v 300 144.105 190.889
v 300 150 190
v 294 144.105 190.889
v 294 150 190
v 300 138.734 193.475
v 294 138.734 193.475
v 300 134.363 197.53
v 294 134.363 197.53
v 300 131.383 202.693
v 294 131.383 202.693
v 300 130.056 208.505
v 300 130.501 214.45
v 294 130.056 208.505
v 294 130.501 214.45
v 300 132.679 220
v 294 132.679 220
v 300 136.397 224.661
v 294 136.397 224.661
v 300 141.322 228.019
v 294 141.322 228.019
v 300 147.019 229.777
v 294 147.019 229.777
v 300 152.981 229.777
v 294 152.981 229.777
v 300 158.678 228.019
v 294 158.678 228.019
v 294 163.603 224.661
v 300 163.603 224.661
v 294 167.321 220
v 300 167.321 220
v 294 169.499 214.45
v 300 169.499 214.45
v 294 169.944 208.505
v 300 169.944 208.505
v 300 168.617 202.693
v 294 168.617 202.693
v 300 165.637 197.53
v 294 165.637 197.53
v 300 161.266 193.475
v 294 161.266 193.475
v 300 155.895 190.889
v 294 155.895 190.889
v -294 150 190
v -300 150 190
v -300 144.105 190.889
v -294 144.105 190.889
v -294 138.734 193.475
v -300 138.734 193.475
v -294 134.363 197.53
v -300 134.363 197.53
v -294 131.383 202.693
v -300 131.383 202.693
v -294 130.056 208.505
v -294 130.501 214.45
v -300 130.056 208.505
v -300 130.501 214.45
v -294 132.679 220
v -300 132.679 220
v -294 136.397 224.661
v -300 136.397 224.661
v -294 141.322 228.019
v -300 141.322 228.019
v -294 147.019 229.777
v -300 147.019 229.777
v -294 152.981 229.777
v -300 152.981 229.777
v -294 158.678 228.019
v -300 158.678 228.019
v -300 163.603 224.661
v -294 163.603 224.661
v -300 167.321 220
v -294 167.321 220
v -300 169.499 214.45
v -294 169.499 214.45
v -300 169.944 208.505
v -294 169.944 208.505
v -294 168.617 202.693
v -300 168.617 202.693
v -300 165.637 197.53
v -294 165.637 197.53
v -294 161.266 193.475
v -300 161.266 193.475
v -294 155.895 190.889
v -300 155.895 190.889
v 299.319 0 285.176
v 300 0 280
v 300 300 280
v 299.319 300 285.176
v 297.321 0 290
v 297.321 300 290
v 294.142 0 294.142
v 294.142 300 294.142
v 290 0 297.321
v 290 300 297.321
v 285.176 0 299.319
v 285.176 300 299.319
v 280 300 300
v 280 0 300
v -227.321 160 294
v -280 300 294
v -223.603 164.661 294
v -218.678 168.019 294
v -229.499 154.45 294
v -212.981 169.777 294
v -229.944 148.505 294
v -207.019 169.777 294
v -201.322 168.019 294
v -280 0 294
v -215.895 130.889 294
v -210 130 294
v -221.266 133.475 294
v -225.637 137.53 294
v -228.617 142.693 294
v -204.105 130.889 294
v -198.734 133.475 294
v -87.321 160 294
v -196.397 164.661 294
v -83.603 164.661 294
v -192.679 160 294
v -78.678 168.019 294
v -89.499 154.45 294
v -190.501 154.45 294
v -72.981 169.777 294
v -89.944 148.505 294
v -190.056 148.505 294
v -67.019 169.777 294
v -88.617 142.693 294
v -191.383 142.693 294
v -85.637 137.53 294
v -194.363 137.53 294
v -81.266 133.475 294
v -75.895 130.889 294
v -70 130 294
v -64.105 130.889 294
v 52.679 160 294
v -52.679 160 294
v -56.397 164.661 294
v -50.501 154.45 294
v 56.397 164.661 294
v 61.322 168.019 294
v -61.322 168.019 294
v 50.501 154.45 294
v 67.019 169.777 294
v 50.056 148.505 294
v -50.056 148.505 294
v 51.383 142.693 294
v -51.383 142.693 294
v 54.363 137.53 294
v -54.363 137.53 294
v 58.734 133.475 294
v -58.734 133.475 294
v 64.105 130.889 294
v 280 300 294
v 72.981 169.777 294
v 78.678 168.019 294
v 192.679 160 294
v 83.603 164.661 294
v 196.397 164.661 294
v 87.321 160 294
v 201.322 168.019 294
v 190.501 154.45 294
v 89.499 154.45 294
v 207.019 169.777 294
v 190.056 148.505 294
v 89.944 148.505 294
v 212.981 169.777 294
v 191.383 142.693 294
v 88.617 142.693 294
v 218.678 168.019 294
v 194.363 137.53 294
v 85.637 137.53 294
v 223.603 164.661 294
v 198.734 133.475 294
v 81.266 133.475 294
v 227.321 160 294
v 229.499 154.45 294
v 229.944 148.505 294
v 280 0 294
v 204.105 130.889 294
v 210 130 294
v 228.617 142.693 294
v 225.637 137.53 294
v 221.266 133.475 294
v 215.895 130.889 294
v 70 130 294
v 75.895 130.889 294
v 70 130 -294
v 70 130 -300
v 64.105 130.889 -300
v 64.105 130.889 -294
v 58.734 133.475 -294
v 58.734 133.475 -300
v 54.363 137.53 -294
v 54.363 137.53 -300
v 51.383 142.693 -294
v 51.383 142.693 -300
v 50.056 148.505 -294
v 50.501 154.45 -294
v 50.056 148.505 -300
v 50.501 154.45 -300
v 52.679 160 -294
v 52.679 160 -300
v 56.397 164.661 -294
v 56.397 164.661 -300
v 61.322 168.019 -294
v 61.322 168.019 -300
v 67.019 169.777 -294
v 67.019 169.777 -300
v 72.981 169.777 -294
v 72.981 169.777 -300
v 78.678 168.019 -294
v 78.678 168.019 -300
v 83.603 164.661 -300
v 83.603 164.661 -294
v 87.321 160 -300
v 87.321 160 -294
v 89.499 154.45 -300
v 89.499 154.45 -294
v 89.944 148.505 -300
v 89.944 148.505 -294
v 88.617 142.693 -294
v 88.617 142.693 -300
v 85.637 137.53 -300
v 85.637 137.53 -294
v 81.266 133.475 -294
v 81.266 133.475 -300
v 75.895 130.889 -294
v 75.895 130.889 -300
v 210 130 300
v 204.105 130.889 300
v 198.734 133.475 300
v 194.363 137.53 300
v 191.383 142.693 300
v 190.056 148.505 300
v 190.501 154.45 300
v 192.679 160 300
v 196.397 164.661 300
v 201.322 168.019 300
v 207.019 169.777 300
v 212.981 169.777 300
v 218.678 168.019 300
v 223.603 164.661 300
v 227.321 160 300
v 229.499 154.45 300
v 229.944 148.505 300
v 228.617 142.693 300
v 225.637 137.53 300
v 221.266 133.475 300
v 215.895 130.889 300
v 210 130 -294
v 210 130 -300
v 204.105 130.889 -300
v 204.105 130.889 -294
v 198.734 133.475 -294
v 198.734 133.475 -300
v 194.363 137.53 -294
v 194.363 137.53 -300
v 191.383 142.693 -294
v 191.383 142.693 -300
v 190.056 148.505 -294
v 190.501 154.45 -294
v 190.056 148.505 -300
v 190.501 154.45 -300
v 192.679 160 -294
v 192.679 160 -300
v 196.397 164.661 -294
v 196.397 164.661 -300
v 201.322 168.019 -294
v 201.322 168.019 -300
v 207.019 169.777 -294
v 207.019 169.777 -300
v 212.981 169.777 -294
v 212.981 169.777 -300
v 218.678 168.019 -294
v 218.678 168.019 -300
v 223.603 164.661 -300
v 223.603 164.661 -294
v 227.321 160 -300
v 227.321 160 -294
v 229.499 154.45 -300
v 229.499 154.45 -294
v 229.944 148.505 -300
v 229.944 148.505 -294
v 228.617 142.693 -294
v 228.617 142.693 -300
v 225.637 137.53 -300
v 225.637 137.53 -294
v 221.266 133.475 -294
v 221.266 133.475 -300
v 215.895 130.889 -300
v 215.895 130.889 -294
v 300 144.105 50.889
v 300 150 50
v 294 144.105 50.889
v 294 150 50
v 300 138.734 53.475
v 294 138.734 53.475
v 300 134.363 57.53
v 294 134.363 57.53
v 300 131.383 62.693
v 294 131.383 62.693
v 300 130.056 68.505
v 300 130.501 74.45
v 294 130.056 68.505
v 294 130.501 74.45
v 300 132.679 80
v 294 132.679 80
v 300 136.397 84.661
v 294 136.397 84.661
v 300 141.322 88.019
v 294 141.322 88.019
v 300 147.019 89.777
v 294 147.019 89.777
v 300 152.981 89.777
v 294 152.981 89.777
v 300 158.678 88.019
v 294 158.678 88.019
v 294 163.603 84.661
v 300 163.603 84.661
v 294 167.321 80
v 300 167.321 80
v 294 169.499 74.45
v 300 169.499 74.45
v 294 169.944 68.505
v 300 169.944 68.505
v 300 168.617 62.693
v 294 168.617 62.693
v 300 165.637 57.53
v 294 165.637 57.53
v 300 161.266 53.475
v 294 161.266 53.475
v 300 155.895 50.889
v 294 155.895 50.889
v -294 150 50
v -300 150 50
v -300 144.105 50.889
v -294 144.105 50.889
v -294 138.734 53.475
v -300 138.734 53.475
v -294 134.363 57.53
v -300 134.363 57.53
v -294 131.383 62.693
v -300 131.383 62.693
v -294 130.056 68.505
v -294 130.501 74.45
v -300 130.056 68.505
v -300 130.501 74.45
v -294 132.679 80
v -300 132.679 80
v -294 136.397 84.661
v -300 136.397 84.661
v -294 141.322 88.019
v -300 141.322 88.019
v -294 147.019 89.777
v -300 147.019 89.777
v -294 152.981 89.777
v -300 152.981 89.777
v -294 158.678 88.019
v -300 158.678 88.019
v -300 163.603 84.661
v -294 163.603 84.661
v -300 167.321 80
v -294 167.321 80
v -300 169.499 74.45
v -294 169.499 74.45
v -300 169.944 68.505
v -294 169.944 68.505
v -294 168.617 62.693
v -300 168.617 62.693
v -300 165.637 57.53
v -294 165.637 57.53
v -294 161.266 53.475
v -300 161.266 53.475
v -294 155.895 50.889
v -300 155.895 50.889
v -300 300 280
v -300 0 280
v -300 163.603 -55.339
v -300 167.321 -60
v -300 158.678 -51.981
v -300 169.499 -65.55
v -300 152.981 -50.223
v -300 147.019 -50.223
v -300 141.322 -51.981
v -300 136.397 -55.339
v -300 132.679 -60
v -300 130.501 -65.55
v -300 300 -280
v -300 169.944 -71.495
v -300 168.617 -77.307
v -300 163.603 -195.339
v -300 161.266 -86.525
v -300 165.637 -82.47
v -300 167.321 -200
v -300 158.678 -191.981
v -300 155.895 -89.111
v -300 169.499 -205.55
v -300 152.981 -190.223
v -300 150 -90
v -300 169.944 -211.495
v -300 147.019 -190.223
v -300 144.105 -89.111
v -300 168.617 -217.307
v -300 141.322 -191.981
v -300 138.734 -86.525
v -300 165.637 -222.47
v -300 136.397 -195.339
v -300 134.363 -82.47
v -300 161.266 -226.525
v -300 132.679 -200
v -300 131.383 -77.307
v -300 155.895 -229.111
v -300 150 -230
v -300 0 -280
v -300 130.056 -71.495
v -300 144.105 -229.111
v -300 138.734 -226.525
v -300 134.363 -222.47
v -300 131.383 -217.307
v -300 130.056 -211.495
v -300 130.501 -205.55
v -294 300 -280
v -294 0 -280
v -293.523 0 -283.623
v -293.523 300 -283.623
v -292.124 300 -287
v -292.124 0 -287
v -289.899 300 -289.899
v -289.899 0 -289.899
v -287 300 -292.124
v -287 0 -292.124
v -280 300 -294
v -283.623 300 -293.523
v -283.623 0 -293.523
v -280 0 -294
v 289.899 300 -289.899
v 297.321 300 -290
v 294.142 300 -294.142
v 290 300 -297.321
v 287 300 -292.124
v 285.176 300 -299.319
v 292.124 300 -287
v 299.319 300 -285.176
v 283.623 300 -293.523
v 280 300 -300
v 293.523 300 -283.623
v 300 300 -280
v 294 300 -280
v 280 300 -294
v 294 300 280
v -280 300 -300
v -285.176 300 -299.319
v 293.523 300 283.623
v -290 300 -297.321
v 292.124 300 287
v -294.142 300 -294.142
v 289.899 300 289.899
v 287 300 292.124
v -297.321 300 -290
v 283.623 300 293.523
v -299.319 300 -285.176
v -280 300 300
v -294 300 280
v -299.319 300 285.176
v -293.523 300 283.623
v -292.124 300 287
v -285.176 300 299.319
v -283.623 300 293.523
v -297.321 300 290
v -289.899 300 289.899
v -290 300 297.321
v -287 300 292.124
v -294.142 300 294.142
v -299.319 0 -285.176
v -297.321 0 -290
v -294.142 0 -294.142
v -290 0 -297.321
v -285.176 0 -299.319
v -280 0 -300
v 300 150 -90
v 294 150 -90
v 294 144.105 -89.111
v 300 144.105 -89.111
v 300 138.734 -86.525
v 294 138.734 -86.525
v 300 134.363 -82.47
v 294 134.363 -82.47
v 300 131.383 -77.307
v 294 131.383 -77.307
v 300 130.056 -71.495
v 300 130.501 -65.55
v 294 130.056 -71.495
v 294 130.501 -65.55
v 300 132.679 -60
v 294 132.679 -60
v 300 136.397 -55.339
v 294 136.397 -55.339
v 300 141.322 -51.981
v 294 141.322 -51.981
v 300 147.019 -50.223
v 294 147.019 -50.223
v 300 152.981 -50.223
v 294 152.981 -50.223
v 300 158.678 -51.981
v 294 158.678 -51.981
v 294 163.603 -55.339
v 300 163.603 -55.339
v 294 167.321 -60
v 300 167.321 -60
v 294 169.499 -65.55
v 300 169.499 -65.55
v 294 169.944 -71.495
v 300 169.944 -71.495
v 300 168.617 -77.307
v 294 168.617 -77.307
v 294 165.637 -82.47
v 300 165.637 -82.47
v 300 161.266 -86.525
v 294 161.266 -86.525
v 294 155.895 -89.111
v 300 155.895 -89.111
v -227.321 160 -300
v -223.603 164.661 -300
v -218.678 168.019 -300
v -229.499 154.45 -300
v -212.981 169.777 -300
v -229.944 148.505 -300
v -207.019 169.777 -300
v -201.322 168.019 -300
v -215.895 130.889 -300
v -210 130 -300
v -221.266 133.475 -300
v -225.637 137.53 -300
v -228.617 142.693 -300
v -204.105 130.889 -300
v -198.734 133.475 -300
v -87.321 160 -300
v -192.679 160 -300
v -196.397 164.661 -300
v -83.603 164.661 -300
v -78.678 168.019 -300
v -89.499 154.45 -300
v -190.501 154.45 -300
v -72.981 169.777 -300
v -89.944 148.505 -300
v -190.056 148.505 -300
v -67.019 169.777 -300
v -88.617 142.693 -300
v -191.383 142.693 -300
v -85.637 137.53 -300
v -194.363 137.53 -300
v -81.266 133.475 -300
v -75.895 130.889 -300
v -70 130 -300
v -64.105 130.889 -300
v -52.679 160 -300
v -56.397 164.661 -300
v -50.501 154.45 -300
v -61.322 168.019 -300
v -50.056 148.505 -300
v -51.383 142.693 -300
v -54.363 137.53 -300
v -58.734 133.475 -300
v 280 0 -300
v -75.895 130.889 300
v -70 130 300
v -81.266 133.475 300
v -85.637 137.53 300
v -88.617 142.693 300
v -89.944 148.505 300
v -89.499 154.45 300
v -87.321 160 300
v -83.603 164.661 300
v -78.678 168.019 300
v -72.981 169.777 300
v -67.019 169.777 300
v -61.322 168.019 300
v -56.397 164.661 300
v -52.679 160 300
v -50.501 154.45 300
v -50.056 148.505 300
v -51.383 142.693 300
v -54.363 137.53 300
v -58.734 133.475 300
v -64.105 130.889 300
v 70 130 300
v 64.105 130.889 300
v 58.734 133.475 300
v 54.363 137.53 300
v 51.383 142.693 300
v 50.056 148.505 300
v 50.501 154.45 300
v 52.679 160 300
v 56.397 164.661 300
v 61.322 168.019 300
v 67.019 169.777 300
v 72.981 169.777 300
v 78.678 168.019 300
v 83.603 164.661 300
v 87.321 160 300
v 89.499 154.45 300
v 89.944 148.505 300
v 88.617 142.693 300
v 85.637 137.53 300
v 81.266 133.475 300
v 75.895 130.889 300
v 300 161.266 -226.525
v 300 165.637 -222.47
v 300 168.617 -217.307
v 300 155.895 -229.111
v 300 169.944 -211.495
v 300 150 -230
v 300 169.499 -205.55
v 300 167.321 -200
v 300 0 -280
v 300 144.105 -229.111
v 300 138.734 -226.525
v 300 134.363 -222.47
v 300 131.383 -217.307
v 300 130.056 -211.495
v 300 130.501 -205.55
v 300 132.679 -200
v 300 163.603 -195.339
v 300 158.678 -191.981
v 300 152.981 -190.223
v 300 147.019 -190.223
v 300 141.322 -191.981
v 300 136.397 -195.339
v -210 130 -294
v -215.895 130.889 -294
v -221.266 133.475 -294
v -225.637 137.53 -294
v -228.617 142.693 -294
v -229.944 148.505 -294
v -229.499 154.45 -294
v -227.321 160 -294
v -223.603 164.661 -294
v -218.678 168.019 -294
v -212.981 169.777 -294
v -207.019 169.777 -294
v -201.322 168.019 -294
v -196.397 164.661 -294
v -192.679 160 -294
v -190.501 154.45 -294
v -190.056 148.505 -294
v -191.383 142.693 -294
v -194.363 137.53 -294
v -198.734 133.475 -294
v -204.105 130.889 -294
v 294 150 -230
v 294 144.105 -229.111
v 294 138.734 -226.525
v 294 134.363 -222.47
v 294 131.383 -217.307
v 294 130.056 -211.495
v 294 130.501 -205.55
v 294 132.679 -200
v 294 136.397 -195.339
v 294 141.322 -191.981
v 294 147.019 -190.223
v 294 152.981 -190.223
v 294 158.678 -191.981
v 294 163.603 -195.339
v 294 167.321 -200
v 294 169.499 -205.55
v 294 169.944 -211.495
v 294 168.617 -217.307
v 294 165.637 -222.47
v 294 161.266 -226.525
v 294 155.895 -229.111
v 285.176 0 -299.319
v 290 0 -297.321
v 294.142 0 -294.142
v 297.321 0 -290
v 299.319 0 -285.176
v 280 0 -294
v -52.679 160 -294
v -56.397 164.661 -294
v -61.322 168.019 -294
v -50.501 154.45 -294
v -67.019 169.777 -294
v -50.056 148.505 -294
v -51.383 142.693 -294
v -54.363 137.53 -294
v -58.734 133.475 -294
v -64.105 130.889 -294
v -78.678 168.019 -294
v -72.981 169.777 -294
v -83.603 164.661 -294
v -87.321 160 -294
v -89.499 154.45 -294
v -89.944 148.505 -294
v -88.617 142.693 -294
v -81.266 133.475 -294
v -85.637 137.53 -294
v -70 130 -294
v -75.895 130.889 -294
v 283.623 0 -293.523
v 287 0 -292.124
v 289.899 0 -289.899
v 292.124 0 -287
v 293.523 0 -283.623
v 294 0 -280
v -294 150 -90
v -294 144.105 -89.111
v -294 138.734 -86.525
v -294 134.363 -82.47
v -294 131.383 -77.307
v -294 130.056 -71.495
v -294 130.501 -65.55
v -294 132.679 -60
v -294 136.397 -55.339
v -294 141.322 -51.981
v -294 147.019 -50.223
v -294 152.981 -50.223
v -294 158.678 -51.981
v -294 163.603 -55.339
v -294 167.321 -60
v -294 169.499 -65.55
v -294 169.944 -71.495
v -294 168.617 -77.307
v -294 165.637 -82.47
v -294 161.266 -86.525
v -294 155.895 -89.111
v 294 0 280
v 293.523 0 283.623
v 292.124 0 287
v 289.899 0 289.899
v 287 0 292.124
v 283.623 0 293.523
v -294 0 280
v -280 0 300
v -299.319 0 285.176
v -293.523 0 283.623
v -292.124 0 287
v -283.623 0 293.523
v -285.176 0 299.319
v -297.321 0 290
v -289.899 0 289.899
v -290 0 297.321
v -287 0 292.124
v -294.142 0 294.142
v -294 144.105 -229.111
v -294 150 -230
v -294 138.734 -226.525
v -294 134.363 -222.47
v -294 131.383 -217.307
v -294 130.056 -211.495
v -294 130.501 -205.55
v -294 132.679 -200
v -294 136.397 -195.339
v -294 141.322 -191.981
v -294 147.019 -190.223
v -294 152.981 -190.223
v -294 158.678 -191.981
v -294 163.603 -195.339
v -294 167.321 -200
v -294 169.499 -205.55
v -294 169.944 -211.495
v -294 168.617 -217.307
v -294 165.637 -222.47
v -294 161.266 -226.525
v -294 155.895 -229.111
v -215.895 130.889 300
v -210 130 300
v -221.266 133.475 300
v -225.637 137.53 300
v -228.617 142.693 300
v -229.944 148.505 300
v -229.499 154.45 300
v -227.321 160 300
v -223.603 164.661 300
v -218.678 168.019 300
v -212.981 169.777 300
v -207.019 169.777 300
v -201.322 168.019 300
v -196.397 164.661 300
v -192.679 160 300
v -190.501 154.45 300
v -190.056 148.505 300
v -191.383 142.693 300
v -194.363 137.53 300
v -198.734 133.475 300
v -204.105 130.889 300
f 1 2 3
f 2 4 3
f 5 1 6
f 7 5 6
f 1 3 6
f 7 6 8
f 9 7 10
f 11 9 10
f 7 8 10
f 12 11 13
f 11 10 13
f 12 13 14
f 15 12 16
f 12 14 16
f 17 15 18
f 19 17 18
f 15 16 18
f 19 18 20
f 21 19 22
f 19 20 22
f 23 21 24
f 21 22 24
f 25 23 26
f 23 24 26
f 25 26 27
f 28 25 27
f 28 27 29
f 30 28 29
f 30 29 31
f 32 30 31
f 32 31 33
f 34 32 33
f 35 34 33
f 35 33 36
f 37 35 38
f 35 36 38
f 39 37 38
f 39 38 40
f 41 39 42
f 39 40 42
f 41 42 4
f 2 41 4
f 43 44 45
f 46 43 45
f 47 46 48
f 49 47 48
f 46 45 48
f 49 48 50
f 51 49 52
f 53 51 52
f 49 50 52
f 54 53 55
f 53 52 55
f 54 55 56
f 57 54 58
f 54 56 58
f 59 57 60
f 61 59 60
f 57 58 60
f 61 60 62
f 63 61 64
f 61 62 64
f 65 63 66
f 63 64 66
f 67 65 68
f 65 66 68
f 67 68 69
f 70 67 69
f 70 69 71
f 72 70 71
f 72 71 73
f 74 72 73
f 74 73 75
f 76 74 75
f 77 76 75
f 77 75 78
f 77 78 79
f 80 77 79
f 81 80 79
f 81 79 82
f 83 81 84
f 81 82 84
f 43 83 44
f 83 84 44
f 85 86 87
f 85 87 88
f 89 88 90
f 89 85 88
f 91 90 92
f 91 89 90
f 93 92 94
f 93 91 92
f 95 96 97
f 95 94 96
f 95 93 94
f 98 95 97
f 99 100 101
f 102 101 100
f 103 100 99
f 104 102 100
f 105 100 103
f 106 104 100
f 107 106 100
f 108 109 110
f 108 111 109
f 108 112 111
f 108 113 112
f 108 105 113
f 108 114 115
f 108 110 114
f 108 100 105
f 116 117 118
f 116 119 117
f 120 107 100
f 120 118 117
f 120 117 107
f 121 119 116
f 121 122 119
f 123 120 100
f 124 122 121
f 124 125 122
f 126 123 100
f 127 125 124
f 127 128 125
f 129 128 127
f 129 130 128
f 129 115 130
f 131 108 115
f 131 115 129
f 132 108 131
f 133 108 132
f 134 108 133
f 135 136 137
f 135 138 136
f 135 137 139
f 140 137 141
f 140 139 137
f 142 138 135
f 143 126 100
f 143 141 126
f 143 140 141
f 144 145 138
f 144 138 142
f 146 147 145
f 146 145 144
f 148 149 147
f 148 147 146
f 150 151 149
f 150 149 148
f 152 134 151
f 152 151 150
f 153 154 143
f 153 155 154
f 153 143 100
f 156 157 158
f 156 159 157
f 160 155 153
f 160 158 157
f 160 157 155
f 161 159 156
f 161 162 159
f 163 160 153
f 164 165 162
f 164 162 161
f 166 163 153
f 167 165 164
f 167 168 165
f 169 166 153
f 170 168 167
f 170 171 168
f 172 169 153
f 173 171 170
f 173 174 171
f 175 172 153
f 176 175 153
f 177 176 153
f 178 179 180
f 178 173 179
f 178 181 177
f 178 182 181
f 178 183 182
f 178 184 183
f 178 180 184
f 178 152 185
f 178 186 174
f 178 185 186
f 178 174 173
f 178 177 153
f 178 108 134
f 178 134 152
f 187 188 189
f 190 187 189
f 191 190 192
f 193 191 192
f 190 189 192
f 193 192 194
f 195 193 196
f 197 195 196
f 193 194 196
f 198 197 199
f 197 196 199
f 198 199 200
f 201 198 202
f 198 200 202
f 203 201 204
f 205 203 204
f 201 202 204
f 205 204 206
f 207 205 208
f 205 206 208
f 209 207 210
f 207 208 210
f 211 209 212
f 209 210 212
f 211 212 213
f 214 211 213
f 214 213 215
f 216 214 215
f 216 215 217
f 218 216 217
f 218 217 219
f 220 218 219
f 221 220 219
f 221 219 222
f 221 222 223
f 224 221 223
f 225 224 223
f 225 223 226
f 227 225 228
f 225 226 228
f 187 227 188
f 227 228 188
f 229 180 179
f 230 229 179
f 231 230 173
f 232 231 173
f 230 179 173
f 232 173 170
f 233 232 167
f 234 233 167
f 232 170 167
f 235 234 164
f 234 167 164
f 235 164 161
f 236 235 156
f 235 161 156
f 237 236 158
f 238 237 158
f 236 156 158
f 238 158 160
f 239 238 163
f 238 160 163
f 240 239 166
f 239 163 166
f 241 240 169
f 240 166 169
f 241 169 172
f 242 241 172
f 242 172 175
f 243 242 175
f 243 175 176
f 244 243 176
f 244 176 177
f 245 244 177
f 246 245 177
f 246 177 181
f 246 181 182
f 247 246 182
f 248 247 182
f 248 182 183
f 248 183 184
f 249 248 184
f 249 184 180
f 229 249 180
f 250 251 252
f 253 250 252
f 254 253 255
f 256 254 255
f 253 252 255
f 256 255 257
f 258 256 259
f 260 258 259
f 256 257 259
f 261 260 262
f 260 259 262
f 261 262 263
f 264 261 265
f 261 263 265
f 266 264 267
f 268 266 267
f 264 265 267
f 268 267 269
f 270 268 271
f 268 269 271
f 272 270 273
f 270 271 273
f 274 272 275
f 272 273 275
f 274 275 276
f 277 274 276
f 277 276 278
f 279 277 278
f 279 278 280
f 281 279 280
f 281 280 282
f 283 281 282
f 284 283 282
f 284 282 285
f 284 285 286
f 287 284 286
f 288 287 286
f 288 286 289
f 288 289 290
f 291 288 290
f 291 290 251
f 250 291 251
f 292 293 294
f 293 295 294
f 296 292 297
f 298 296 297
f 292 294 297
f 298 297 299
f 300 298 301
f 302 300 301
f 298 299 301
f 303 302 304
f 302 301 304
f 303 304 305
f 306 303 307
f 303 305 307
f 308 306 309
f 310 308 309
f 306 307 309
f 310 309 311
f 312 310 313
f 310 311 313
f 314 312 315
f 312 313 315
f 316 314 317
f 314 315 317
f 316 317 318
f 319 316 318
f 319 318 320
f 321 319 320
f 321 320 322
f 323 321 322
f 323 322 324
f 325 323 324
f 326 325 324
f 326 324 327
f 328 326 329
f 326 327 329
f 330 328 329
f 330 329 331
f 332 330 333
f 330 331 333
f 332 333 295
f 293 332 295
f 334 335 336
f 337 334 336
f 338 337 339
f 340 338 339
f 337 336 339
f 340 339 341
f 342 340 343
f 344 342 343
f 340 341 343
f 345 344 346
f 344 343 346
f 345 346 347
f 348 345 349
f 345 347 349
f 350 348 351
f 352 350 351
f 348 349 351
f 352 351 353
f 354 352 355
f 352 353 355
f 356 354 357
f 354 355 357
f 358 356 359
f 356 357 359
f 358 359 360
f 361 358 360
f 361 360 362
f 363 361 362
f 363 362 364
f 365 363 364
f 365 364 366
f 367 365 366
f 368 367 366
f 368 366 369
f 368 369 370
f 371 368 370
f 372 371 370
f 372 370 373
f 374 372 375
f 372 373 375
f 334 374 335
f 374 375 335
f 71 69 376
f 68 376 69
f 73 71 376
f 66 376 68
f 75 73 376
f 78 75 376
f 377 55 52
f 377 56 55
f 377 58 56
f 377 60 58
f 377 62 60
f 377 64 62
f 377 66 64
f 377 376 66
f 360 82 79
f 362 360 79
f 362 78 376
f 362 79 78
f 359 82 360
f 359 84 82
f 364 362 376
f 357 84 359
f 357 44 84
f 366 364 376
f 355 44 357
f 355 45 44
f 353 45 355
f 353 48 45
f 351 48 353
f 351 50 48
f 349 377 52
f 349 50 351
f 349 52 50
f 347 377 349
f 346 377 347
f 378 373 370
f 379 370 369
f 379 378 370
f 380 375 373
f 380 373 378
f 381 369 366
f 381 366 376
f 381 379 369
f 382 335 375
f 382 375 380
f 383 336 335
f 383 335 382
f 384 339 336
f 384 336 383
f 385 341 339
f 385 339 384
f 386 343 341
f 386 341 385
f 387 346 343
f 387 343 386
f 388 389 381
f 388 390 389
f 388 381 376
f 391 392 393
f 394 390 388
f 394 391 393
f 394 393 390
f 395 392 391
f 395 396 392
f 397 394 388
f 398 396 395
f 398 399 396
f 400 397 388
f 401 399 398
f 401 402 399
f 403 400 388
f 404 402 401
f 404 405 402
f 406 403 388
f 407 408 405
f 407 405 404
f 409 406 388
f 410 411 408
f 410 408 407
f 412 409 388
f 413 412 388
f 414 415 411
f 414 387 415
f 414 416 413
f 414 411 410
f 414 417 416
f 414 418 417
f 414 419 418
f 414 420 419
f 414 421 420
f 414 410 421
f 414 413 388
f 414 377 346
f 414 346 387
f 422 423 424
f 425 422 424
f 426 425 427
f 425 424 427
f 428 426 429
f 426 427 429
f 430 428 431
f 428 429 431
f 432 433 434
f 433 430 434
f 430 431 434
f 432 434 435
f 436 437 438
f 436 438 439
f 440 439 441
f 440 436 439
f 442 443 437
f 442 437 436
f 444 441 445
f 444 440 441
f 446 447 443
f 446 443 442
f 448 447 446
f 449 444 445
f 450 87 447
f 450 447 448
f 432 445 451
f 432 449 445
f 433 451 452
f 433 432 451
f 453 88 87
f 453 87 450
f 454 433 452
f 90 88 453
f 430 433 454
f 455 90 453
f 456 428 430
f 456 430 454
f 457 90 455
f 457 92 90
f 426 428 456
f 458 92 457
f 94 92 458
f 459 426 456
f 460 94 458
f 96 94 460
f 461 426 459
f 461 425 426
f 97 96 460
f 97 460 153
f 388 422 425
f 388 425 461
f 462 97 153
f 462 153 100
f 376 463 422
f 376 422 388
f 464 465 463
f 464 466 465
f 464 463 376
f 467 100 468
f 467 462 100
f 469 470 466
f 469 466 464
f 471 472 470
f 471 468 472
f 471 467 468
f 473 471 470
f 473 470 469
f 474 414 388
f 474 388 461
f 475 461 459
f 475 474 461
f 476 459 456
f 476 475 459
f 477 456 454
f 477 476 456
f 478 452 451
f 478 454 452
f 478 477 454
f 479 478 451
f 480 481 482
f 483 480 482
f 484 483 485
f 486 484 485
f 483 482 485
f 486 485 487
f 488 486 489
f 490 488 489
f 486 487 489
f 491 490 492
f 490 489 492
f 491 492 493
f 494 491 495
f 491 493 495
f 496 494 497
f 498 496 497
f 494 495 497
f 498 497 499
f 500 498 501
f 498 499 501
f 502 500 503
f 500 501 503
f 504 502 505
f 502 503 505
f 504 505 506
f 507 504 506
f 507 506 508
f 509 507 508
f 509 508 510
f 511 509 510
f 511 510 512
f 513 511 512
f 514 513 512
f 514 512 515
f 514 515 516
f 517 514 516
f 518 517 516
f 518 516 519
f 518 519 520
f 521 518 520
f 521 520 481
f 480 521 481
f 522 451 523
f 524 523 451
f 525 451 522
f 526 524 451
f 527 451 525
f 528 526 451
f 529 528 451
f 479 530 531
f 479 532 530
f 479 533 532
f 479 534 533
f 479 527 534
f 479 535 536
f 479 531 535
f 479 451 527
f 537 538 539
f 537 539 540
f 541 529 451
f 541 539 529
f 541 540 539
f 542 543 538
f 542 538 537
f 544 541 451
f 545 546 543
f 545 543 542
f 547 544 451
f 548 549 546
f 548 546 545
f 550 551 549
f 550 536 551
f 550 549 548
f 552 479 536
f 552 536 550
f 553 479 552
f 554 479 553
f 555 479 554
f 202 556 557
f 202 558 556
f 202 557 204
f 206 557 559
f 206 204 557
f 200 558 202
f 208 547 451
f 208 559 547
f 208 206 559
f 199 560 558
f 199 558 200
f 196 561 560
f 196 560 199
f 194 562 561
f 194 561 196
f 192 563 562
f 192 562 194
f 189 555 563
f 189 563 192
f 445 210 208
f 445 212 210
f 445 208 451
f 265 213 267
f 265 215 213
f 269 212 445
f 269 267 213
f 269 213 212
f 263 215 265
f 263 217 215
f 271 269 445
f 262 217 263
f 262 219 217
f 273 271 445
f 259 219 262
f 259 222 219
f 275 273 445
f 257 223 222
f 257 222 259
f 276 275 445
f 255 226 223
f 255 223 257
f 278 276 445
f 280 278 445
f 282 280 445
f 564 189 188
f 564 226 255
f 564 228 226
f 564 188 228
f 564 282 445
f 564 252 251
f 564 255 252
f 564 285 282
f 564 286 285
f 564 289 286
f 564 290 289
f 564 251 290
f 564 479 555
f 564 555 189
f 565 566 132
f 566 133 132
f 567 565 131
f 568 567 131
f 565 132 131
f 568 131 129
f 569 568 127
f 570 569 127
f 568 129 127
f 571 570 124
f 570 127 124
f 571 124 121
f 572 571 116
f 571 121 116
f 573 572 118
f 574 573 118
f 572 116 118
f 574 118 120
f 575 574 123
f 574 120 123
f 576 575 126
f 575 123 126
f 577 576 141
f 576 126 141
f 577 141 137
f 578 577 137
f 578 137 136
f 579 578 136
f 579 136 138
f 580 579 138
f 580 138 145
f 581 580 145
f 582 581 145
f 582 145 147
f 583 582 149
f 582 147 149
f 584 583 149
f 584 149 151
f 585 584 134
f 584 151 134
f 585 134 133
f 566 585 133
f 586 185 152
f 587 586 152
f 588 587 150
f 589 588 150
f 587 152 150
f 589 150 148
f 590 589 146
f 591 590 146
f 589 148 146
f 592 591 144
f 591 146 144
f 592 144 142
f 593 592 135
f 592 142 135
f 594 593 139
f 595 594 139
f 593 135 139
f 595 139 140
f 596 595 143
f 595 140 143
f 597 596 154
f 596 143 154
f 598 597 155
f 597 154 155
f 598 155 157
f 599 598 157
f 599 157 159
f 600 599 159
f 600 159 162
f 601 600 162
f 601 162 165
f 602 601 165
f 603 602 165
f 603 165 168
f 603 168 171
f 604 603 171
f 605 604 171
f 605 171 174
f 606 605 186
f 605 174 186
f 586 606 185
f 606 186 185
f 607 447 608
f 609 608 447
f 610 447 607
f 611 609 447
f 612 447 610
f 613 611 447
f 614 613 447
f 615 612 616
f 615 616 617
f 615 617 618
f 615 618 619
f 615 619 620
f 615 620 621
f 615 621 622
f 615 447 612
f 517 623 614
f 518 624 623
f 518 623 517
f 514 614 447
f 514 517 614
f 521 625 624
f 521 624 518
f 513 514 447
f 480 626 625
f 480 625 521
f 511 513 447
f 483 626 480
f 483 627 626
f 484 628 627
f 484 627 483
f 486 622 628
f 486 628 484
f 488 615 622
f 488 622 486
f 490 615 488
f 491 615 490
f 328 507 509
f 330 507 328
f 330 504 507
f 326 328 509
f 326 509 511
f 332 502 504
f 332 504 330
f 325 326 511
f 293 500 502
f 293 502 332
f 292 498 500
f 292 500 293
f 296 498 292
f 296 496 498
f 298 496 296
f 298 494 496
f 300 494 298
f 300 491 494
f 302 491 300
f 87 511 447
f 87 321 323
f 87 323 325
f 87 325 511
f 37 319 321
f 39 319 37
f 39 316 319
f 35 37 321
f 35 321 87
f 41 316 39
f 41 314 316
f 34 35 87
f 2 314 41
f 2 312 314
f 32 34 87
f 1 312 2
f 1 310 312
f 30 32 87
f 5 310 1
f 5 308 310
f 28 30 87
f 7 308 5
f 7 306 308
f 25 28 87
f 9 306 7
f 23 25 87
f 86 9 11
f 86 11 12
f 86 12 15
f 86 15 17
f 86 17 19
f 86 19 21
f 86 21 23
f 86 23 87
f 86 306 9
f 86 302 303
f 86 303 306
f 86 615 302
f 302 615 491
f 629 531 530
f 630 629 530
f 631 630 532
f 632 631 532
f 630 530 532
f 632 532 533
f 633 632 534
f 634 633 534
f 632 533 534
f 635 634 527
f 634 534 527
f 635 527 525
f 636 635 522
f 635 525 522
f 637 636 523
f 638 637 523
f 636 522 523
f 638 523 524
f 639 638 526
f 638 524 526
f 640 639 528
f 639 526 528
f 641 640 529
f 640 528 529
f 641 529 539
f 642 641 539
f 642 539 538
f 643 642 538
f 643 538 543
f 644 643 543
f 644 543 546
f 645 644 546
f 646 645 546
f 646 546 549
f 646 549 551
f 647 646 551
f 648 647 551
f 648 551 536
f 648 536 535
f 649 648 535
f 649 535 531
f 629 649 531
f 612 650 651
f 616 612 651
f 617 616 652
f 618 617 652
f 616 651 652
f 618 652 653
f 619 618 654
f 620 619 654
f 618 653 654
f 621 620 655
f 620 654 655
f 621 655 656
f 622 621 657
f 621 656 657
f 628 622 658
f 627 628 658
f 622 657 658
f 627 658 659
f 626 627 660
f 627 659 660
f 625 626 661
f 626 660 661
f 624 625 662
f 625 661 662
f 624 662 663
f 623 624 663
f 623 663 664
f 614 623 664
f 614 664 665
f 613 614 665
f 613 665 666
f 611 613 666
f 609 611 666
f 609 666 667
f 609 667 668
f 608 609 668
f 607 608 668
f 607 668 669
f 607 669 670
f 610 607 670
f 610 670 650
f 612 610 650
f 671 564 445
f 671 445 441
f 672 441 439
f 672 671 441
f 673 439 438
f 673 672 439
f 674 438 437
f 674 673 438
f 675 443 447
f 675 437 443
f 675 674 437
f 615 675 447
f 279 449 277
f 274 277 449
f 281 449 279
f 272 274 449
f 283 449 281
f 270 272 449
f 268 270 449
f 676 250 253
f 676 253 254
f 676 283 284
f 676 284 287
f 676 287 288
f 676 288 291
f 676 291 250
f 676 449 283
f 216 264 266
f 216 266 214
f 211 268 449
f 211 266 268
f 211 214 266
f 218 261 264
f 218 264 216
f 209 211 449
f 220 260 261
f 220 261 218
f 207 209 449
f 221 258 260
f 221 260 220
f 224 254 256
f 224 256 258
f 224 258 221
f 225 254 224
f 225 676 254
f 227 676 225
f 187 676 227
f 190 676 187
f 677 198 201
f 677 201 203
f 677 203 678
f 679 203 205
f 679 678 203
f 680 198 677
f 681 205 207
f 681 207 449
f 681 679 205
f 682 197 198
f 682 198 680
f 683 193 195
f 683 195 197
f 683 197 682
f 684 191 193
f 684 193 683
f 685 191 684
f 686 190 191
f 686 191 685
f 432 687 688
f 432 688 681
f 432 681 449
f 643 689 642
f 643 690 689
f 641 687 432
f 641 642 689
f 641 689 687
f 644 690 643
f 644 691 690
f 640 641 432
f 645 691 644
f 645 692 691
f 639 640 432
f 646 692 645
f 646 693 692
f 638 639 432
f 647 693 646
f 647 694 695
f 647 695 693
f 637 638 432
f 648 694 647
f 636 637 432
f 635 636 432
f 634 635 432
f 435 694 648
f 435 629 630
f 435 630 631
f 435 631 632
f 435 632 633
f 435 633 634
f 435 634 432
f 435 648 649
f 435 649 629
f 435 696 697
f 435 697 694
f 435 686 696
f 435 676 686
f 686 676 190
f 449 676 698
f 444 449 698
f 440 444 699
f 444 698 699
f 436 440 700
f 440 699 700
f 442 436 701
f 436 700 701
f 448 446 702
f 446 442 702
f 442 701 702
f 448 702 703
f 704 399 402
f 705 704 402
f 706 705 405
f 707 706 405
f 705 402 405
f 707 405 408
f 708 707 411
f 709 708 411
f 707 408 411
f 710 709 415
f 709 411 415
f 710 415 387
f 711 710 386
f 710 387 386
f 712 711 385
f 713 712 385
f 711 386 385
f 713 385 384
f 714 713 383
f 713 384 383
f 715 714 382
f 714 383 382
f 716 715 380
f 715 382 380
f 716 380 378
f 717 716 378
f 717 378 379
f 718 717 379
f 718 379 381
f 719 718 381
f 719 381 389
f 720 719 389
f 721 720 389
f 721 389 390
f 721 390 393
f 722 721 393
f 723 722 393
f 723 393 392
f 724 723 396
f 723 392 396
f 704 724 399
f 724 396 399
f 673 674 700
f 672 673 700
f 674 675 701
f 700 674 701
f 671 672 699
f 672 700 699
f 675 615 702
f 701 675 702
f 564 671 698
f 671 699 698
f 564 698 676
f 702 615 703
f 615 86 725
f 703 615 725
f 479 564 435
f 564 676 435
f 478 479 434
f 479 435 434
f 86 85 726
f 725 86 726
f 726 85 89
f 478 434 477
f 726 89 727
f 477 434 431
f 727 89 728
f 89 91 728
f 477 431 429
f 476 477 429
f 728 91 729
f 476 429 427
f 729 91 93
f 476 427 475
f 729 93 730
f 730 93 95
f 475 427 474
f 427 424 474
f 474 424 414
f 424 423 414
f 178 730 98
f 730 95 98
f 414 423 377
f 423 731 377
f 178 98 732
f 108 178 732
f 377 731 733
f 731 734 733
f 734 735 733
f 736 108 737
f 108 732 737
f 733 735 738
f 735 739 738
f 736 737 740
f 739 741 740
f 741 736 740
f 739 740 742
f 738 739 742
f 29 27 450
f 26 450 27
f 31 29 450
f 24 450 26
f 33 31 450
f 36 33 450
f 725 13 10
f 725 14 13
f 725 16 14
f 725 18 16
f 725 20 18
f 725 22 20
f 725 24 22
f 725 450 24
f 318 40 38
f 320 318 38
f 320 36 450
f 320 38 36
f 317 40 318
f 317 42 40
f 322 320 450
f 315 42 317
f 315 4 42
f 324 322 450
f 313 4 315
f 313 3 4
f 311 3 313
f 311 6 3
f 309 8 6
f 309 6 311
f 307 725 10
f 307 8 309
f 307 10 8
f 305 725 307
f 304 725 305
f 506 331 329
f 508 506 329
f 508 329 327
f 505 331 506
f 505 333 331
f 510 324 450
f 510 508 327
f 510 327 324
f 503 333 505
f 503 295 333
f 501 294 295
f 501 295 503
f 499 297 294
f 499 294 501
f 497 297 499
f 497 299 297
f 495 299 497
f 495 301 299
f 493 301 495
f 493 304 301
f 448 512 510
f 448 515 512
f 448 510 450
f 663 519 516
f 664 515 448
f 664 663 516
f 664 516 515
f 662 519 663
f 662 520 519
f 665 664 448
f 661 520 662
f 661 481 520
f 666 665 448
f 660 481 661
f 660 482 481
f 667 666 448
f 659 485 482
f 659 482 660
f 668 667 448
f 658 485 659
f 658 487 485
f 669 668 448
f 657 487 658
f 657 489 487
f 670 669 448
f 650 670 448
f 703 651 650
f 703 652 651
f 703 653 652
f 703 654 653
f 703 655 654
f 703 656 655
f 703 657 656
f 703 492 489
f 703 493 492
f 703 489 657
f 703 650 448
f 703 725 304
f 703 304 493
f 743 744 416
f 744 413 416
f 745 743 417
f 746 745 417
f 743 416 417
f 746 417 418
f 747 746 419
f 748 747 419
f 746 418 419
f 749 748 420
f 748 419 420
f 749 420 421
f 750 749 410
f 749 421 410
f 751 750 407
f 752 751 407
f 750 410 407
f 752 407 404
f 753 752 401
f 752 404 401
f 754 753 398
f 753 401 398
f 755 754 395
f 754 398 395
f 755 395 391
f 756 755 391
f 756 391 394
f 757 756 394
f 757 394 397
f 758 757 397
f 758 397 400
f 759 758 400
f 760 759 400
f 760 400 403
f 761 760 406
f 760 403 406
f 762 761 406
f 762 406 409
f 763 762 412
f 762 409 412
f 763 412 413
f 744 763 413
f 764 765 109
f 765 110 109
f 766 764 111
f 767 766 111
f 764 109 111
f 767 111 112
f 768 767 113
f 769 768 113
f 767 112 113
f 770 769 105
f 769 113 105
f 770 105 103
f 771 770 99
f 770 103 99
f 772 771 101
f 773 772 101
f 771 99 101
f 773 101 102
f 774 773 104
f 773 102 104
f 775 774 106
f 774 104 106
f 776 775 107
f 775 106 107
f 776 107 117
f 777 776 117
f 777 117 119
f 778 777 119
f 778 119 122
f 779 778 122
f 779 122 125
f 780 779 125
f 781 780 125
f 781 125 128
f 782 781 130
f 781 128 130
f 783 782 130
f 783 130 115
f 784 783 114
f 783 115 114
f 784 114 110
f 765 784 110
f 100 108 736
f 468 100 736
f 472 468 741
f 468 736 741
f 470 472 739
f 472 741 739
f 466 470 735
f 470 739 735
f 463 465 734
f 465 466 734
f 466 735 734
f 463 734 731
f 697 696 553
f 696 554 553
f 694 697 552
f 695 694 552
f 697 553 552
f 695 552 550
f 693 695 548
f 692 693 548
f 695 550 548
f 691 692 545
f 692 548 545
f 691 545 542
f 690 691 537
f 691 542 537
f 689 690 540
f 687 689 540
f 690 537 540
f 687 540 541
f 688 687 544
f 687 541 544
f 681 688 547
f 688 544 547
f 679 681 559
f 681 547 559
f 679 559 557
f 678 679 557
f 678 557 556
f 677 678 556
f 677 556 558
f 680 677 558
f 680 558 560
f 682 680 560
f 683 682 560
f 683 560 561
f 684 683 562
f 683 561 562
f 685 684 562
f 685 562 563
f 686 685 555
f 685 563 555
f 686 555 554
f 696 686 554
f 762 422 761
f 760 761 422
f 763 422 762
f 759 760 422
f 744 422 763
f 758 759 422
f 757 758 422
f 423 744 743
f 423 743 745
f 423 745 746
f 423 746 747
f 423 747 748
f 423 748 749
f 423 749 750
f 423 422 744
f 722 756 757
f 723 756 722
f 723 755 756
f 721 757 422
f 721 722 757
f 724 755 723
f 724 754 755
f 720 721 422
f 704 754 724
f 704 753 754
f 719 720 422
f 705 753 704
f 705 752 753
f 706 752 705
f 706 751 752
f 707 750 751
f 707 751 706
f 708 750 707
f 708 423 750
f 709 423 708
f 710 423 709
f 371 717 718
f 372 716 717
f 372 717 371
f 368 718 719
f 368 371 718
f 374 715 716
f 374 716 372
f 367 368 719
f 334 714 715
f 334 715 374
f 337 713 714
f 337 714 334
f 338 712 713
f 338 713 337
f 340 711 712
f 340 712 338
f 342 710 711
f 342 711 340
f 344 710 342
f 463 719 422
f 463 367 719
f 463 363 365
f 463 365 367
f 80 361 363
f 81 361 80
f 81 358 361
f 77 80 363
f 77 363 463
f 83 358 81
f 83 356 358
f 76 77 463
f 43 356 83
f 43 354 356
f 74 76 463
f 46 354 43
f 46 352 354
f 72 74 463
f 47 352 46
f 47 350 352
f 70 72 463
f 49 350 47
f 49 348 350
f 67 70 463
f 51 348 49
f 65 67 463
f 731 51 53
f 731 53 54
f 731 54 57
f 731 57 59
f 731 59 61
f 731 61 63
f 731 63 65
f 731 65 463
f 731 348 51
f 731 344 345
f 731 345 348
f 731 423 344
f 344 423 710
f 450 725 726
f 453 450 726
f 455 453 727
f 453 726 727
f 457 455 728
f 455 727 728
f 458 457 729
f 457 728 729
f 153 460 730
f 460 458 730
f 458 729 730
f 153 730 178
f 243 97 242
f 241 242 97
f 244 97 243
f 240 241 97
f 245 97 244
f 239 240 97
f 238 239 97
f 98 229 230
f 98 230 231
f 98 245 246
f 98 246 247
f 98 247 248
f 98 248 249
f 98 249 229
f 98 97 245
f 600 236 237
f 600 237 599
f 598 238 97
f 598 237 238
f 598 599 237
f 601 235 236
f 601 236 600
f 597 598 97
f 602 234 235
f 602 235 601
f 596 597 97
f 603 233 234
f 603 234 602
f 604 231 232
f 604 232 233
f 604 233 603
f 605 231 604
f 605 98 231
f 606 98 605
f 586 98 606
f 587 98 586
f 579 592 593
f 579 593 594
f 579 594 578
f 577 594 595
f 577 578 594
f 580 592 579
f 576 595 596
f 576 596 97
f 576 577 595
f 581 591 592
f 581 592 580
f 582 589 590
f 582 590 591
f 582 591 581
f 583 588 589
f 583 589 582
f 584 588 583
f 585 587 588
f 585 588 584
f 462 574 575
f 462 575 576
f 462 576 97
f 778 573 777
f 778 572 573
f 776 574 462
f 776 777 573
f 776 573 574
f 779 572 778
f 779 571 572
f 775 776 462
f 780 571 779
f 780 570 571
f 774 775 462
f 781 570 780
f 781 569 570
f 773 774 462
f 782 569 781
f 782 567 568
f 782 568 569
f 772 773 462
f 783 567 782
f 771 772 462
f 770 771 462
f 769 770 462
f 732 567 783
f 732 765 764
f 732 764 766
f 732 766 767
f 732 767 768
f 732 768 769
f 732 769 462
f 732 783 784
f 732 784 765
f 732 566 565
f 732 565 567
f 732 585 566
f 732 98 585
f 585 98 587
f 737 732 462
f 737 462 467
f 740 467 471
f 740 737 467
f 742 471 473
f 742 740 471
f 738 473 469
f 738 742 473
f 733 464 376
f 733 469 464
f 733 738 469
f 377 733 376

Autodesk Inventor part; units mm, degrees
ref_plane "YZ Plane" through (0, 0, 0) normal (1, 0, 0) x (0, 1, 0)
ref_plane "XZ Plane" through (0, 0, 0) normal (0, 1, 0) x (-1, 0, 0)
ref_plane "XY Plane" through (0, 0, 0) normal (0, 0, 1) x (1, 0, 0)
sketch "Sketch1" plane through (0, 0, 0) normal (0, 1, 0) x (-1, 0, 0)
  line L0 (-280, 300) -> (280, 300)
  line L1 (300, 280) -> (300, -280)
  line L2 (280, -300) -> (-280, -300)
  line L3 (-300, -280) -> (-300, 280)
  line L4 (-300, 300) -> (300, -300) construction
  line L5 (300, 300) -> (-300, -300) construction
  arc A0 (300, 280) -> (280, 300) centre (280, 280) ccw
  arc A1 (280, -300) -> (300, -280) centre (280, -280) ccw
  arc A2 (-300, -280) -> (-280, -300) centre (-280, -280) ccw
  arc A3 (-280, 300) -> (-300, 280) centre (-280, 280) ccw
  line L6 (280, 294) -> (-280, 294)
  arc A4 (-280, 294) -> (-294, 280) centre (-280, 280) ccw
  line L7 (-294, 280) -> (-294, -280)
  arc A5 (-294, -280) -> (-280, -294) centre (-280, -280) ccw
  line L8 (-280, -294) -> (280, -294)
  arc A6 (280, -294) -> (294, -280) centre (280, -280) ccw
  line L9 (294, -280) -> (294, 280)
  arc A7 (294, 280) -> (280, 294) centre (280, 280) ccw
  point P0 (0, 0)
  dimension "d0" = 600
  dimension "d1" = 600
  dimension "d2" = 20
  dimension "d3" = 6
extrude "Extrusion1" add sketch "Sketch1" along normal blind 300
sketch "Sketch2" plane through (300, 0, 280) normal (1, 0, 0) x (0, 0, -1)
  line L0 (0, 0) -> (0, 300) projected
  line L1 (0, 150) -> (560, 150) construction
  line L2 (560, 0) -> (560, 300) projected
  point P0 (280, 0)
  point P1 (70, 150)
  point P2 (210, 150)
  point P3 (350, 150)
  point P4 (490, 150)
  dimension "d6" = 70
  dimension "d7" = 140
  dimension "d8" = 140
  dimension "d9" = 140
hole "Hole1" at (300, 150, 210) at (300, 150, 70) at (300, 150, -70) at (300, 150, -210) direction (-1, 0, 0) diameter 40 end through all
sketch "Sketch3" plane through (-280, 0, 300) normal (0, 0, 1) x (1, 0, 0)
  line L0 (0, 0) -> (0, 300) projected
  line L1 (0, 150) -> (560, 150) construction
  line L2 (560, 0) -> (560, 300) projected
  point P0 (280, 0)
  point P1 (70, 150)
  point P2 (210, 150)
  point P3 (350, 150)
  point P4 (490, 150)
  dimension "d17" = 70
  dimension "d18" = 140
  dimension "d19" = 140
  dimension "d20" = 140
hole "Hole2" at (-210, 150, 300) at (-70, 150, 300) at (70, 150, 300) at (210, 150, 300) direction (0, 0, -1) diameter 40 end through all
properties part number "Stackbox-40mm"
